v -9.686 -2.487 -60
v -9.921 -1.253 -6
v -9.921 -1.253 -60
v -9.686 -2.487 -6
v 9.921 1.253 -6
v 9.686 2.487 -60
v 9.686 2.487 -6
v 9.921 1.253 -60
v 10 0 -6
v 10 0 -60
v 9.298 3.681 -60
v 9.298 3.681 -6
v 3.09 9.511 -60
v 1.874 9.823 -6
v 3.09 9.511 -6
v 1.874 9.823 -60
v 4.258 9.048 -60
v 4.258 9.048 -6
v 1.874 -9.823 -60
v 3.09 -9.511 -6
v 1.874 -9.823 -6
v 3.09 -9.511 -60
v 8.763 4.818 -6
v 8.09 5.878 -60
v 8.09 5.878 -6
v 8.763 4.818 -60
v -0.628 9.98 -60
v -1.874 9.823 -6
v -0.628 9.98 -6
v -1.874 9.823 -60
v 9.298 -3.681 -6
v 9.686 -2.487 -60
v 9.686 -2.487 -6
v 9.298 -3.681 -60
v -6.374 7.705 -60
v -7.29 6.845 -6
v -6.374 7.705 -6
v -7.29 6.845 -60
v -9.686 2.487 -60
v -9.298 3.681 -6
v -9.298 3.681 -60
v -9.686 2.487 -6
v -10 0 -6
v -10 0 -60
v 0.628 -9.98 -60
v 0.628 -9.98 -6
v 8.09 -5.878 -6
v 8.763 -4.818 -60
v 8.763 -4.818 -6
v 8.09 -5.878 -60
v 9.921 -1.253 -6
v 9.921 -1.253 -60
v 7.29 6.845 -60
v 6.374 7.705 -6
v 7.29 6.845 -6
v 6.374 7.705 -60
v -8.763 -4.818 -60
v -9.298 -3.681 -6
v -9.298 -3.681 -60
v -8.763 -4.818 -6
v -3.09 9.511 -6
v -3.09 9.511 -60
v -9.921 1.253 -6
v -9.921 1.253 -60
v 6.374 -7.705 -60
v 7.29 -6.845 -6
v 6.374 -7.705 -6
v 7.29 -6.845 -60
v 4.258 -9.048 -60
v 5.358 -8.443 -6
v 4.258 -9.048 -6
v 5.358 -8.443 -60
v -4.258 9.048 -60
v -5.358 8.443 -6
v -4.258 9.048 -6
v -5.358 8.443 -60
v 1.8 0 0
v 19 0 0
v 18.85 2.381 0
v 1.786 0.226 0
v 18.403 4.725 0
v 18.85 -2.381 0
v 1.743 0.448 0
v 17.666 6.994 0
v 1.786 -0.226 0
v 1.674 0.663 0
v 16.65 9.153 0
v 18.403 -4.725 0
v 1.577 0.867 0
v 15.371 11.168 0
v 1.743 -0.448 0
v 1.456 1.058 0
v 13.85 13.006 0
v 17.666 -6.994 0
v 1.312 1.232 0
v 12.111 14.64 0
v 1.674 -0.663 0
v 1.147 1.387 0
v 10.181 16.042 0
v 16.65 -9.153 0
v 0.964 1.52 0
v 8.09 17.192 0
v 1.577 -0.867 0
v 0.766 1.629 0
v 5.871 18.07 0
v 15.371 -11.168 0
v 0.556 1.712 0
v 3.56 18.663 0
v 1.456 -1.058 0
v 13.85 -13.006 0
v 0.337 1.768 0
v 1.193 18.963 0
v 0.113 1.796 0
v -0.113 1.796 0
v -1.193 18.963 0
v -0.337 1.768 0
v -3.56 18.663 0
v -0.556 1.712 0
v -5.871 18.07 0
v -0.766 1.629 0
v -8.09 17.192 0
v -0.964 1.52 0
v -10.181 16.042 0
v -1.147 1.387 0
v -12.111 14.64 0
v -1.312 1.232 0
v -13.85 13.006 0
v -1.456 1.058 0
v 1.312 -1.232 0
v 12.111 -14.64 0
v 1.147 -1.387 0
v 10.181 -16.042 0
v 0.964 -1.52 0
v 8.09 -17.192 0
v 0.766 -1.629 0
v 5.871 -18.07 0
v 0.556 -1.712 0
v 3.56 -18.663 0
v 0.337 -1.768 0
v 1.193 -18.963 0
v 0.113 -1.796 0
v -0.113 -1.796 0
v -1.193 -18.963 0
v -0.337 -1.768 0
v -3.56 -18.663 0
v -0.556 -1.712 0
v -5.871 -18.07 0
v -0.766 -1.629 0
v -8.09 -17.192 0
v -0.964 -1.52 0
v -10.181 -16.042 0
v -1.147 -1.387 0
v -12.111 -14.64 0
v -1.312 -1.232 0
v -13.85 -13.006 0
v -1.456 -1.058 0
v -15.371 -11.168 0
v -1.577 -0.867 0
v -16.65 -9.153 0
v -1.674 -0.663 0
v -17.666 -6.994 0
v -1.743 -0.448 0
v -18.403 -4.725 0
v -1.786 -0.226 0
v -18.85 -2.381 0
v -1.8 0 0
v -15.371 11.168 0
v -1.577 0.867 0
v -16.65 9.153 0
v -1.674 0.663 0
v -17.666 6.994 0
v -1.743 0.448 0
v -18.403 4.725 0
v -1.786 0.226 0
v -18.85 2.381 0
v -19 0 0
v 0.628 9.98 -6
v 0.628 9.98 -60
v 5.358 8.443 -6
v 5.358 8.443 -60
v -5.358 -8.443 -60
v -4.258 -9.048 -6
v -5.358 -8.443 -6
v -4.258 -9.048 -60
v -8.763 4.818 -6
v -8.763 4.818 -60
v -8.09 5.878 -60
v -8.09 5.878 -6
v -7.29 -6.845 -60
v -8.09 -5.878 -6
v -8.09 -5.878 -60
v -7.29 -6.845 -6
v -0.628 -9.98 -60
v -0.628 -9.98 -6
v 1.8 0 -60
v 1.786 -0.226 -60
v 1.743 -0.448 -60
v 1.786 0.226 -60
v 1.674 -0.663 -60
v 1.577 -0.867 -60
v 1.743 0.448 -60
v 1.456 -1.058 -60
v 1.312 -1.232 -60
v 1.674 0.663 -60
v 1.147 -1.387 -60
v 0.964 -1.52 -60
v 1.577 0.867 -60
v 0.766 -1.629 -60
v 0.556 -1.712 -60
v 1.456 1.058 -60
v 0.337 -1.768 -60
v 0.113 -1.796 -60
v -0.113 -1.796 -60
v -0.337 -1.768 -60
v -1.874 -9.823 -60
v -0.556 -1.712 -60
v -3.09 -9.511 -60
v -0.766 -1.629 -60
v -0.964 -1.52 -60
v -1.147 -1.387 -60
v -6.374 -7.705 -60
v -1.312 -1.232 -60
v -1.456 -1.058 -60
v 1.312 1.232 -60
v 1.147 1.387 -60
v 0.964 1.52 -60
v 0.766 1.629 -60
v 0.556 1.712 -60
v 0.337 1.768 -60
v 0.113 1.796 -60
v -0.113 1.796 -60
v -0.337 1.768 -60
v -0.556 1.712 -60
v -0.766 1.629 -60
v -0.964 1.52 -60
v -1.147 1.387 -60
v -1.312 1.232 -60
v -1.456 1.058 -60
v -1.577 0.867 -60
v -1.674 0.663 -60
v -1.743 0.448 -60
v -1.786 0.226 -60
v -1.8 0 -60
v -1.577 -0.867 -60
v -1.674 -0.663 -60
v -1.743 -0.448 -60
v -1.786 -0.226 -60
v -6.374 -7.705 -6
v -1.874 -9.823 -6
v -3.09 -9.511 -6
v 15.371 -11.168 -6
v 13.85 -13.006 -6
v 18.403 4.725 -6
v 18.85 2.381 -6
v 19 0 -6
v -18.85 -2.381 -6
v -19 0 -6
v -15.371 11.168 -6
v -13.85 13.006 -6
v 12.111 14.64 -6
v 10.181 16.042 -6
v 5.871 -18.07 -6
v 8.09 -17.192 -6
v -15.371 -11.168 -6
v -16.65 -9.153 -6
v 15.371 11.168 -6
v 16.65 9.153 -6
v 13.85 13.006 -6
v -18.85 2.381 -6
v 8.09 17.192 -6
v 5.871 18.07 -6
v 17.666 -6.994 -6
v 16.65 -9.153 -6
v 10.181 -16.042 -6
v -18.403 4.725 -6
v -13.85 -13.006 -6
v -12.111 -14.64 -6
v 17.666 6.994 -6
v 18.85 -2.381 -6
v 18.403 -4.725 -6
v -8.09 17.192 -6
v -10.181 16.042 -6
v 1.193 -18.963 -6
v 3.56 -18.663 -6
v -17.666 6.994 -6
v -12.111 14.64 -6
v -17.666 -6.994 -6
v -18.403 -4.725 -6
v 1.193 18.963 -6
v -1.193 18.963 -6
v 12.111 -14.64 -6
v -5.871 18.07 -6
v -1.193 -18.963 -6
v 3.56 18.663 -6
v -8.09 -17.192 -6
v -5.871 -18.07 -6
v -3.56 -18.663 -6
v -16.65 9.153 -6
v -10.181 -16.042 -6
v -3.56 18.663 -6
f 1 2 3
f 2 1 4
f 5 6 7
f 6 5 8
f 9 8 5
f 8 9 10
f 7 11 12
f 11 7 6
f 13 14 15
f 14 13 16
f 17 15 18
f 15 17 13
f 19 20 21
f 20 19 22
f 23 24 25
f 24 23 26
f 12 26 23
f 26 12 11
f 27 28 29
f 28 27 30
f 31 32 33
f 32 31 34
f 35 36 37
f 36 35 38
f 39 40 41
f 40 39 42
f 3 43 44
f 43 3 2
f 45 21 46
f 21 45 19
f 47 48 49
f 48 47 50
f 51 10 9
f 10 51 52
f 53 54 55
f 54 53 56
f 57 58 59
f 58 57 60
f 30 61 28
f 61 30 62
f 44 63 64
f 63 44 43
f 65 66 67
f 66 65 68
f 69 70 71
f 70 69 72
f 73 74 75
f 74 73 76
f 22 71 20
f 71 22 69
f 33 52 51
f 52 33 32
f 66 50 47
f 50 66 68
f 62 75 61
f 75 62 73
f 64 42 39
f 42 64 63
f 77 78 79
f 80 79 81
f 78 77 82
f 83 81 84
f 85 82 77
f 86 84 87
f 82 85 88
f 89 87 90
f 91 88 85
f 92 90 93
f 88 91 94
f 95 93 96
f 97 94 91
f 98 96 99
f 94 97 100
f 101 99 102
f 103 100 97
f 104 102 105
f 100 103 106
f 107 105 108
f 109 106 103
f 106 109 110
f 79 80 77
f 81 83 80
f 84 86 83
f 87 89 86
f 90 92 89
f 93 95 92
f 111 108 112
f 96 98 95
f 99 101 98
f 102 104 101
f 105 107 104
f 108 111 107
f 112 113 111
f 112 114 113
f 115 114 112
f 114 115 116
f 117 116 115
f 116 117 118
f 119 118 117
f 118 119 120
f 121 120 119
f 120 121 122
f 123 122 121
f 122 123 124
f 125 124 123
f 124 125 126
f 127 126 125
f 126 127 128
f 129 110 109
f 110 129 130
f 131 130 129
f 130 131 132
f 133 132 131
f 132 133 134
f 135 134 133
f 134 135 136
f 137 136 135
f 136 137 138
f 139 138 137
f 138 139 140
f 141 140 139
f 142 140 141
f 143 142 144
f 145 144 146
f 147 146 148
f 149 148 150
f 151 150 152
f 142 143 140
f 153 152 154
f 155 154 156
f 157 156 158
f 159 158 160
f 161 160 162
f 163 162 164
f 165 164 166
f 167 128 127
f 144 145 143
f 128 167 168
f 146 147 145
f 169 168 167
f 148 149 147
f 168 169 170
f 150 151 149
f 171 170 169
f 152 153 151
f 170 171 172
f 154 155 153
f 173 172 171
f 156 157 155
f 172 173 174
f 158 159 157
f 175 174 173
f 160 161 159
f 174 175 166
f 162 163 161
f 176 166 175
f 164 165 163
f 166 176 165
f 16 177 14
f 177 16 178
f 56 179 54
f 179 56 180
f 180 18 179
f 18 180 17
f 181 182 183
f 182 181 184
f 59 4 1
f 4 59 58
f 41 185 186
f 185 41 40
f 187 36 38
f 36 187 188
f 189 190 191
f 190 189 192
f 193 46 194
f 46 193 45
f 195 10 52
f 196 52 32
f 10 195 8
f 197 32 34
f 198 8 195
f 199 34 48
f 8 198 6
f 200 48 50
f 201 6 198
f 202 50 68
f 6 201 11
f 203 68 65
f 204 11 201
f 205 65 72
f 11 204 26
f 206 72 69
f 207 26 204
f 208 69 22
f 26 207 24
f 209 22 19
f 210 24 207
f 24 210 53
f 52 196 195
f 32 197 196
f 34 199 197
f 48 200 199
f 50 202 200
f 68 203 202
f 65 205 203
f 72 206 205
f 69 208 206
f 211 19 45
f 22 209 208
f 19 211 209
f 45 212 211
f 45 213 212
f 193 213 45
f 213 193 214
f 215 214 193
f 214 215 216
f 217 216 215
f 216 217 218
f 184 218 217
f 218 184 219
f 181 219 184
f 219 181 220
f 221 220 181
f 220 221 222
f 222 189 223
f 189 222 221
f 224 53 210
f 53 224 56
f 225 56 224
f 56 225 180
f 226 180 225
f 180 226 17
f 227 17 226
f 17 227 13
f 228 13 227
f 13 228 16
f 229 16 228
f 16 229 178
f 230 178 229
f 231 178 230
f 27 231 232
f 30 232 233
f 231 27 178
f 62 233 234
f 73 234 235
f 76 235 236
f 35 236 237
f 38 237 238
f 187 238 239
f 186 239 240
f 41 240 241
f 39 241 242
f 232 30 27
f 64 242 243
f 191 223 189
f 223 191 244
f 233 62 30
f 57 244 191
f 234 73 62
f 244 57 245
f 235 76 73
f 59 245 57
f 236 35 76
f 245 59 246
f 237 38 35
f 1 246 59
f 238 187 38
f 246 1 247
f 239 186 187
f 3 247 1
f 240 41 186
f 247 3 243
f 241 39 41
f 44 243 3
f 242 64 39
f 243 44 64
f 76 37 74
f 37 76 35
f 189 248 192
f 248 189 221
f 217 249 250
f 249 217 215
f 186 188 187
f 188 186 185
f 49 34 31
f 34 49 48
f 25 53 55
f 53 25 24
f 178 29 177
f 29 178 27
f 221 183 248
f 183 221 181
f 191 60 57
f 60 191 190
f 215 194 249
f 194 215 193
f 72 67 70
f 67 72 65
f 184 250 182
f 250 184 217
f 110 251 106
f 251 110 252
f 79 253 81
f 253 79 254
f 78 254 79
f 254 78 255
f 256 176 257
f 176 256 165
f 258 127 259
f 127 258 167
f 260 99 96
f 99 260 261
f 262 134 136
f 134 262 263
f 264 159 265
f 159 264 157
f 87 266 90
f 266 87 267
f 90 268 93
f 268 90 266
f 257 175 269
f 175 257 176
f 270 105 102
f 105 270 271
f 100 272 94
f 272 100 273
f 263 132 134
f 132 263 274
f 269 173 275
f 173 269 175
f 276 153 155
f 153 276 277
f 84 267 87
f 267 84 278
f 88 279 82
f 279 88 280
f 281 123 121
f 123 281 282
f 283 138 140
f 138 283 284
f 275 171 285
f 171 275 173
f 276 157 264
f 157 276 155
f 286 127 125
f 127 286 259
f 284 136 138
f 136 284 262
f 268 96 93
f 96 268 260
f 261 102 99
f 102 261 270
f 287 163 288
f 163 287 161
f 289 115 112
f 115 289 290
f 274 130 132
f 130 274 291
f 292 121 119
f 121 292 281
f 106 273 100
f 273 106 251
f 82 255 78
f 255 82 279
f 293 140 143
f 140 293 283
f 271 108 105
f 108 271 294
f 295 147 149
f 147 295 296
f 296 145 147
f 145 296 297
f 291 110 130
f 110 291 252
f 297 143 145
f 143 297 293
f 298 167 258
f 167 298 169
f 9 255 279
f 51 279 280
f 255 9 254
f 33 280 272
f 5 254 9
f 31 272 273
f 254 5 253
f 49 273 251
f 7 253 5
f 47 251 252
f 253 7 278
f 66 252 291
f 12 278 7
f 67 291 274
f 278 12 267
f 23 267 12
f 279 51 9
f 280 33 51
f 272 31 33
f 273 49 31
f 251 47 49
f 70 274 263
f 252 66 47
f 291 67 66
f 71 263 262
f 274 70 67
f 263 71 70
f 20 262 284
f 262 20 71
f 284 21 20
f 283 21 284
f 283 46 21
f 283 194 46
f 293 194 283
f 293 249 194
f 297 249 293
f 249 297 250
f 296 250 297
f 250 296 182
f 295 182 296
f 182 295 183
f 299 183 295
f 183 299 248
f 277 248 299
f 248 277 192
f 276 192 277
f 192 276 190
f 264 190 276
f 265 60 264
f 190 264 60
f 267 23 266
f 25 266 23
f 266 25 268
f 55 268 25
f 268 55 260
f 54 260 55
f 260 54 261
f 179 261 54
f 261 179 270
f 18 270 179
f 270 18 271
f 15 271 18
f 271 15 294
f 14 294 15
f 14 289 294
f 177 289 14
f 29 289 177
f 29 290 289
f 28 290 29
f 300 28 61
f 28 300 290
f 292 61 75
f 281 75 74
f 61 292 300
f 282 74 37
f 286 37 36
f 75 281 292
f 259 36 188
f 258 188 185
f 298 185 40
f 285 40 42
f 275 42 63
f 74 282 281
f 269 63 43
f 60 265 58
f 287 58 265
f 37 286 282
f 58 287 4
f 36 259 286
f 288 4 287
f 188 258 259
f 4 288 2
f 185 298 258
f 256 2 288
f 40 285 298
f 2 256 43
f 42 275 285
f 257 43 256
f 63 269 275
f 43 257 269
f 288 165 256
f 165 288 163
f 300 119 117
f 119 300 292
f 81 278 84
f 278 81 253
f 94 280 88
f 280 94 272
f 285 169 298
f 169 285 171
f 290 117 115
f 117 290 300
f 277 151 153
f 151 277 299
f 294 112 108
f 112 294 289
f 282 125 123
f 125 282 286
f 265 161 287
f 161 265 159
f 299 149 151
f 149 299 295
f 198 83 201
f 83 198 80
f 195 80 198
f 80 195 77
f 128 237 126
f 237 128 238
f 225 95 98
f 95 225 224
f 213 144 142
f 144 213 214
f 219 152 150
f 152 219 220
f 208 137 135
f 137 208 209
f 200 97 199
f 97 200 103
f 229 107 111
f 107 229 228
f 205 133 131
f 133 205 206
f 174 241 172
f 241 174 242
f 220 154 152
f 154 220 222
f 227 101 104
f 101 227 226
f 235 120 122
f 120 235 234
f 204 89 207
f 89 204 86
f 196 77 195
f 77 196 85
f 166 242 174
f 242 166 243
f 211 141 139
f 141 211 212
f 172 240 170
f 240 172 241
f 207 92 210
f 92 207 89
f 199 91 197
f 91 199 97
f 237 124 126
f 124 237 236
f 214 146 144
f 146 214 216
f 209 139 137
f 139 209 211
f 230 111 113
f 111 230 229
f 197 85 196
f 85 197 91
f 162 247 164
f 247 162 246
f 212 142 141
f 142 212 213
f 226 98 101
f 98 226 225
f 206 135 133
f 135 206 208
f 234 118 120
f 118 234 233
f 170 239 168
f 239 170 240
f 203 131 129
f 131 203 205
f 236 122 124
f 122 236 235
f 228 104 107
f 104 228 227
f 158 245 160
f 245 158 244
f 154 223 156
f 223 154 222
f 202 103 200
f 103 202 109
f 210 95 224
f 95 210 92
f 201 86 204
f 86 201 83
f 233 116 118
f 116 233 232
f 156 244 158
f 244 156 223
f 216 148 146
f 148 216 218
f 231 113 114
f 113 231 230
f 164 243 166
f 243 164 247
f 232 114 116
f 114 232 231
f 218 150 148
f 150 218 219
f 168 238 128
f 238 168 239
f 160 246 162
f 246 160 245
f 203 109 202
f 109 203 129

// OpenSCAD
$fn = 50;


difference() {
	union() {
		translate(v = [0, 0, -60.0000000000]) {
			cylinder(h = 60, r = 10.0000000000);
		}
		translate(v = [0, 0, -6.0000000000]) {
			cylinder(h = 6, r = 19.0000000000);
		}
	}
	union() {
		#translate(v = [0, 0, -60]) {
			cylinder(h = 60, r = 1.8000000000);
		}
	}
}
